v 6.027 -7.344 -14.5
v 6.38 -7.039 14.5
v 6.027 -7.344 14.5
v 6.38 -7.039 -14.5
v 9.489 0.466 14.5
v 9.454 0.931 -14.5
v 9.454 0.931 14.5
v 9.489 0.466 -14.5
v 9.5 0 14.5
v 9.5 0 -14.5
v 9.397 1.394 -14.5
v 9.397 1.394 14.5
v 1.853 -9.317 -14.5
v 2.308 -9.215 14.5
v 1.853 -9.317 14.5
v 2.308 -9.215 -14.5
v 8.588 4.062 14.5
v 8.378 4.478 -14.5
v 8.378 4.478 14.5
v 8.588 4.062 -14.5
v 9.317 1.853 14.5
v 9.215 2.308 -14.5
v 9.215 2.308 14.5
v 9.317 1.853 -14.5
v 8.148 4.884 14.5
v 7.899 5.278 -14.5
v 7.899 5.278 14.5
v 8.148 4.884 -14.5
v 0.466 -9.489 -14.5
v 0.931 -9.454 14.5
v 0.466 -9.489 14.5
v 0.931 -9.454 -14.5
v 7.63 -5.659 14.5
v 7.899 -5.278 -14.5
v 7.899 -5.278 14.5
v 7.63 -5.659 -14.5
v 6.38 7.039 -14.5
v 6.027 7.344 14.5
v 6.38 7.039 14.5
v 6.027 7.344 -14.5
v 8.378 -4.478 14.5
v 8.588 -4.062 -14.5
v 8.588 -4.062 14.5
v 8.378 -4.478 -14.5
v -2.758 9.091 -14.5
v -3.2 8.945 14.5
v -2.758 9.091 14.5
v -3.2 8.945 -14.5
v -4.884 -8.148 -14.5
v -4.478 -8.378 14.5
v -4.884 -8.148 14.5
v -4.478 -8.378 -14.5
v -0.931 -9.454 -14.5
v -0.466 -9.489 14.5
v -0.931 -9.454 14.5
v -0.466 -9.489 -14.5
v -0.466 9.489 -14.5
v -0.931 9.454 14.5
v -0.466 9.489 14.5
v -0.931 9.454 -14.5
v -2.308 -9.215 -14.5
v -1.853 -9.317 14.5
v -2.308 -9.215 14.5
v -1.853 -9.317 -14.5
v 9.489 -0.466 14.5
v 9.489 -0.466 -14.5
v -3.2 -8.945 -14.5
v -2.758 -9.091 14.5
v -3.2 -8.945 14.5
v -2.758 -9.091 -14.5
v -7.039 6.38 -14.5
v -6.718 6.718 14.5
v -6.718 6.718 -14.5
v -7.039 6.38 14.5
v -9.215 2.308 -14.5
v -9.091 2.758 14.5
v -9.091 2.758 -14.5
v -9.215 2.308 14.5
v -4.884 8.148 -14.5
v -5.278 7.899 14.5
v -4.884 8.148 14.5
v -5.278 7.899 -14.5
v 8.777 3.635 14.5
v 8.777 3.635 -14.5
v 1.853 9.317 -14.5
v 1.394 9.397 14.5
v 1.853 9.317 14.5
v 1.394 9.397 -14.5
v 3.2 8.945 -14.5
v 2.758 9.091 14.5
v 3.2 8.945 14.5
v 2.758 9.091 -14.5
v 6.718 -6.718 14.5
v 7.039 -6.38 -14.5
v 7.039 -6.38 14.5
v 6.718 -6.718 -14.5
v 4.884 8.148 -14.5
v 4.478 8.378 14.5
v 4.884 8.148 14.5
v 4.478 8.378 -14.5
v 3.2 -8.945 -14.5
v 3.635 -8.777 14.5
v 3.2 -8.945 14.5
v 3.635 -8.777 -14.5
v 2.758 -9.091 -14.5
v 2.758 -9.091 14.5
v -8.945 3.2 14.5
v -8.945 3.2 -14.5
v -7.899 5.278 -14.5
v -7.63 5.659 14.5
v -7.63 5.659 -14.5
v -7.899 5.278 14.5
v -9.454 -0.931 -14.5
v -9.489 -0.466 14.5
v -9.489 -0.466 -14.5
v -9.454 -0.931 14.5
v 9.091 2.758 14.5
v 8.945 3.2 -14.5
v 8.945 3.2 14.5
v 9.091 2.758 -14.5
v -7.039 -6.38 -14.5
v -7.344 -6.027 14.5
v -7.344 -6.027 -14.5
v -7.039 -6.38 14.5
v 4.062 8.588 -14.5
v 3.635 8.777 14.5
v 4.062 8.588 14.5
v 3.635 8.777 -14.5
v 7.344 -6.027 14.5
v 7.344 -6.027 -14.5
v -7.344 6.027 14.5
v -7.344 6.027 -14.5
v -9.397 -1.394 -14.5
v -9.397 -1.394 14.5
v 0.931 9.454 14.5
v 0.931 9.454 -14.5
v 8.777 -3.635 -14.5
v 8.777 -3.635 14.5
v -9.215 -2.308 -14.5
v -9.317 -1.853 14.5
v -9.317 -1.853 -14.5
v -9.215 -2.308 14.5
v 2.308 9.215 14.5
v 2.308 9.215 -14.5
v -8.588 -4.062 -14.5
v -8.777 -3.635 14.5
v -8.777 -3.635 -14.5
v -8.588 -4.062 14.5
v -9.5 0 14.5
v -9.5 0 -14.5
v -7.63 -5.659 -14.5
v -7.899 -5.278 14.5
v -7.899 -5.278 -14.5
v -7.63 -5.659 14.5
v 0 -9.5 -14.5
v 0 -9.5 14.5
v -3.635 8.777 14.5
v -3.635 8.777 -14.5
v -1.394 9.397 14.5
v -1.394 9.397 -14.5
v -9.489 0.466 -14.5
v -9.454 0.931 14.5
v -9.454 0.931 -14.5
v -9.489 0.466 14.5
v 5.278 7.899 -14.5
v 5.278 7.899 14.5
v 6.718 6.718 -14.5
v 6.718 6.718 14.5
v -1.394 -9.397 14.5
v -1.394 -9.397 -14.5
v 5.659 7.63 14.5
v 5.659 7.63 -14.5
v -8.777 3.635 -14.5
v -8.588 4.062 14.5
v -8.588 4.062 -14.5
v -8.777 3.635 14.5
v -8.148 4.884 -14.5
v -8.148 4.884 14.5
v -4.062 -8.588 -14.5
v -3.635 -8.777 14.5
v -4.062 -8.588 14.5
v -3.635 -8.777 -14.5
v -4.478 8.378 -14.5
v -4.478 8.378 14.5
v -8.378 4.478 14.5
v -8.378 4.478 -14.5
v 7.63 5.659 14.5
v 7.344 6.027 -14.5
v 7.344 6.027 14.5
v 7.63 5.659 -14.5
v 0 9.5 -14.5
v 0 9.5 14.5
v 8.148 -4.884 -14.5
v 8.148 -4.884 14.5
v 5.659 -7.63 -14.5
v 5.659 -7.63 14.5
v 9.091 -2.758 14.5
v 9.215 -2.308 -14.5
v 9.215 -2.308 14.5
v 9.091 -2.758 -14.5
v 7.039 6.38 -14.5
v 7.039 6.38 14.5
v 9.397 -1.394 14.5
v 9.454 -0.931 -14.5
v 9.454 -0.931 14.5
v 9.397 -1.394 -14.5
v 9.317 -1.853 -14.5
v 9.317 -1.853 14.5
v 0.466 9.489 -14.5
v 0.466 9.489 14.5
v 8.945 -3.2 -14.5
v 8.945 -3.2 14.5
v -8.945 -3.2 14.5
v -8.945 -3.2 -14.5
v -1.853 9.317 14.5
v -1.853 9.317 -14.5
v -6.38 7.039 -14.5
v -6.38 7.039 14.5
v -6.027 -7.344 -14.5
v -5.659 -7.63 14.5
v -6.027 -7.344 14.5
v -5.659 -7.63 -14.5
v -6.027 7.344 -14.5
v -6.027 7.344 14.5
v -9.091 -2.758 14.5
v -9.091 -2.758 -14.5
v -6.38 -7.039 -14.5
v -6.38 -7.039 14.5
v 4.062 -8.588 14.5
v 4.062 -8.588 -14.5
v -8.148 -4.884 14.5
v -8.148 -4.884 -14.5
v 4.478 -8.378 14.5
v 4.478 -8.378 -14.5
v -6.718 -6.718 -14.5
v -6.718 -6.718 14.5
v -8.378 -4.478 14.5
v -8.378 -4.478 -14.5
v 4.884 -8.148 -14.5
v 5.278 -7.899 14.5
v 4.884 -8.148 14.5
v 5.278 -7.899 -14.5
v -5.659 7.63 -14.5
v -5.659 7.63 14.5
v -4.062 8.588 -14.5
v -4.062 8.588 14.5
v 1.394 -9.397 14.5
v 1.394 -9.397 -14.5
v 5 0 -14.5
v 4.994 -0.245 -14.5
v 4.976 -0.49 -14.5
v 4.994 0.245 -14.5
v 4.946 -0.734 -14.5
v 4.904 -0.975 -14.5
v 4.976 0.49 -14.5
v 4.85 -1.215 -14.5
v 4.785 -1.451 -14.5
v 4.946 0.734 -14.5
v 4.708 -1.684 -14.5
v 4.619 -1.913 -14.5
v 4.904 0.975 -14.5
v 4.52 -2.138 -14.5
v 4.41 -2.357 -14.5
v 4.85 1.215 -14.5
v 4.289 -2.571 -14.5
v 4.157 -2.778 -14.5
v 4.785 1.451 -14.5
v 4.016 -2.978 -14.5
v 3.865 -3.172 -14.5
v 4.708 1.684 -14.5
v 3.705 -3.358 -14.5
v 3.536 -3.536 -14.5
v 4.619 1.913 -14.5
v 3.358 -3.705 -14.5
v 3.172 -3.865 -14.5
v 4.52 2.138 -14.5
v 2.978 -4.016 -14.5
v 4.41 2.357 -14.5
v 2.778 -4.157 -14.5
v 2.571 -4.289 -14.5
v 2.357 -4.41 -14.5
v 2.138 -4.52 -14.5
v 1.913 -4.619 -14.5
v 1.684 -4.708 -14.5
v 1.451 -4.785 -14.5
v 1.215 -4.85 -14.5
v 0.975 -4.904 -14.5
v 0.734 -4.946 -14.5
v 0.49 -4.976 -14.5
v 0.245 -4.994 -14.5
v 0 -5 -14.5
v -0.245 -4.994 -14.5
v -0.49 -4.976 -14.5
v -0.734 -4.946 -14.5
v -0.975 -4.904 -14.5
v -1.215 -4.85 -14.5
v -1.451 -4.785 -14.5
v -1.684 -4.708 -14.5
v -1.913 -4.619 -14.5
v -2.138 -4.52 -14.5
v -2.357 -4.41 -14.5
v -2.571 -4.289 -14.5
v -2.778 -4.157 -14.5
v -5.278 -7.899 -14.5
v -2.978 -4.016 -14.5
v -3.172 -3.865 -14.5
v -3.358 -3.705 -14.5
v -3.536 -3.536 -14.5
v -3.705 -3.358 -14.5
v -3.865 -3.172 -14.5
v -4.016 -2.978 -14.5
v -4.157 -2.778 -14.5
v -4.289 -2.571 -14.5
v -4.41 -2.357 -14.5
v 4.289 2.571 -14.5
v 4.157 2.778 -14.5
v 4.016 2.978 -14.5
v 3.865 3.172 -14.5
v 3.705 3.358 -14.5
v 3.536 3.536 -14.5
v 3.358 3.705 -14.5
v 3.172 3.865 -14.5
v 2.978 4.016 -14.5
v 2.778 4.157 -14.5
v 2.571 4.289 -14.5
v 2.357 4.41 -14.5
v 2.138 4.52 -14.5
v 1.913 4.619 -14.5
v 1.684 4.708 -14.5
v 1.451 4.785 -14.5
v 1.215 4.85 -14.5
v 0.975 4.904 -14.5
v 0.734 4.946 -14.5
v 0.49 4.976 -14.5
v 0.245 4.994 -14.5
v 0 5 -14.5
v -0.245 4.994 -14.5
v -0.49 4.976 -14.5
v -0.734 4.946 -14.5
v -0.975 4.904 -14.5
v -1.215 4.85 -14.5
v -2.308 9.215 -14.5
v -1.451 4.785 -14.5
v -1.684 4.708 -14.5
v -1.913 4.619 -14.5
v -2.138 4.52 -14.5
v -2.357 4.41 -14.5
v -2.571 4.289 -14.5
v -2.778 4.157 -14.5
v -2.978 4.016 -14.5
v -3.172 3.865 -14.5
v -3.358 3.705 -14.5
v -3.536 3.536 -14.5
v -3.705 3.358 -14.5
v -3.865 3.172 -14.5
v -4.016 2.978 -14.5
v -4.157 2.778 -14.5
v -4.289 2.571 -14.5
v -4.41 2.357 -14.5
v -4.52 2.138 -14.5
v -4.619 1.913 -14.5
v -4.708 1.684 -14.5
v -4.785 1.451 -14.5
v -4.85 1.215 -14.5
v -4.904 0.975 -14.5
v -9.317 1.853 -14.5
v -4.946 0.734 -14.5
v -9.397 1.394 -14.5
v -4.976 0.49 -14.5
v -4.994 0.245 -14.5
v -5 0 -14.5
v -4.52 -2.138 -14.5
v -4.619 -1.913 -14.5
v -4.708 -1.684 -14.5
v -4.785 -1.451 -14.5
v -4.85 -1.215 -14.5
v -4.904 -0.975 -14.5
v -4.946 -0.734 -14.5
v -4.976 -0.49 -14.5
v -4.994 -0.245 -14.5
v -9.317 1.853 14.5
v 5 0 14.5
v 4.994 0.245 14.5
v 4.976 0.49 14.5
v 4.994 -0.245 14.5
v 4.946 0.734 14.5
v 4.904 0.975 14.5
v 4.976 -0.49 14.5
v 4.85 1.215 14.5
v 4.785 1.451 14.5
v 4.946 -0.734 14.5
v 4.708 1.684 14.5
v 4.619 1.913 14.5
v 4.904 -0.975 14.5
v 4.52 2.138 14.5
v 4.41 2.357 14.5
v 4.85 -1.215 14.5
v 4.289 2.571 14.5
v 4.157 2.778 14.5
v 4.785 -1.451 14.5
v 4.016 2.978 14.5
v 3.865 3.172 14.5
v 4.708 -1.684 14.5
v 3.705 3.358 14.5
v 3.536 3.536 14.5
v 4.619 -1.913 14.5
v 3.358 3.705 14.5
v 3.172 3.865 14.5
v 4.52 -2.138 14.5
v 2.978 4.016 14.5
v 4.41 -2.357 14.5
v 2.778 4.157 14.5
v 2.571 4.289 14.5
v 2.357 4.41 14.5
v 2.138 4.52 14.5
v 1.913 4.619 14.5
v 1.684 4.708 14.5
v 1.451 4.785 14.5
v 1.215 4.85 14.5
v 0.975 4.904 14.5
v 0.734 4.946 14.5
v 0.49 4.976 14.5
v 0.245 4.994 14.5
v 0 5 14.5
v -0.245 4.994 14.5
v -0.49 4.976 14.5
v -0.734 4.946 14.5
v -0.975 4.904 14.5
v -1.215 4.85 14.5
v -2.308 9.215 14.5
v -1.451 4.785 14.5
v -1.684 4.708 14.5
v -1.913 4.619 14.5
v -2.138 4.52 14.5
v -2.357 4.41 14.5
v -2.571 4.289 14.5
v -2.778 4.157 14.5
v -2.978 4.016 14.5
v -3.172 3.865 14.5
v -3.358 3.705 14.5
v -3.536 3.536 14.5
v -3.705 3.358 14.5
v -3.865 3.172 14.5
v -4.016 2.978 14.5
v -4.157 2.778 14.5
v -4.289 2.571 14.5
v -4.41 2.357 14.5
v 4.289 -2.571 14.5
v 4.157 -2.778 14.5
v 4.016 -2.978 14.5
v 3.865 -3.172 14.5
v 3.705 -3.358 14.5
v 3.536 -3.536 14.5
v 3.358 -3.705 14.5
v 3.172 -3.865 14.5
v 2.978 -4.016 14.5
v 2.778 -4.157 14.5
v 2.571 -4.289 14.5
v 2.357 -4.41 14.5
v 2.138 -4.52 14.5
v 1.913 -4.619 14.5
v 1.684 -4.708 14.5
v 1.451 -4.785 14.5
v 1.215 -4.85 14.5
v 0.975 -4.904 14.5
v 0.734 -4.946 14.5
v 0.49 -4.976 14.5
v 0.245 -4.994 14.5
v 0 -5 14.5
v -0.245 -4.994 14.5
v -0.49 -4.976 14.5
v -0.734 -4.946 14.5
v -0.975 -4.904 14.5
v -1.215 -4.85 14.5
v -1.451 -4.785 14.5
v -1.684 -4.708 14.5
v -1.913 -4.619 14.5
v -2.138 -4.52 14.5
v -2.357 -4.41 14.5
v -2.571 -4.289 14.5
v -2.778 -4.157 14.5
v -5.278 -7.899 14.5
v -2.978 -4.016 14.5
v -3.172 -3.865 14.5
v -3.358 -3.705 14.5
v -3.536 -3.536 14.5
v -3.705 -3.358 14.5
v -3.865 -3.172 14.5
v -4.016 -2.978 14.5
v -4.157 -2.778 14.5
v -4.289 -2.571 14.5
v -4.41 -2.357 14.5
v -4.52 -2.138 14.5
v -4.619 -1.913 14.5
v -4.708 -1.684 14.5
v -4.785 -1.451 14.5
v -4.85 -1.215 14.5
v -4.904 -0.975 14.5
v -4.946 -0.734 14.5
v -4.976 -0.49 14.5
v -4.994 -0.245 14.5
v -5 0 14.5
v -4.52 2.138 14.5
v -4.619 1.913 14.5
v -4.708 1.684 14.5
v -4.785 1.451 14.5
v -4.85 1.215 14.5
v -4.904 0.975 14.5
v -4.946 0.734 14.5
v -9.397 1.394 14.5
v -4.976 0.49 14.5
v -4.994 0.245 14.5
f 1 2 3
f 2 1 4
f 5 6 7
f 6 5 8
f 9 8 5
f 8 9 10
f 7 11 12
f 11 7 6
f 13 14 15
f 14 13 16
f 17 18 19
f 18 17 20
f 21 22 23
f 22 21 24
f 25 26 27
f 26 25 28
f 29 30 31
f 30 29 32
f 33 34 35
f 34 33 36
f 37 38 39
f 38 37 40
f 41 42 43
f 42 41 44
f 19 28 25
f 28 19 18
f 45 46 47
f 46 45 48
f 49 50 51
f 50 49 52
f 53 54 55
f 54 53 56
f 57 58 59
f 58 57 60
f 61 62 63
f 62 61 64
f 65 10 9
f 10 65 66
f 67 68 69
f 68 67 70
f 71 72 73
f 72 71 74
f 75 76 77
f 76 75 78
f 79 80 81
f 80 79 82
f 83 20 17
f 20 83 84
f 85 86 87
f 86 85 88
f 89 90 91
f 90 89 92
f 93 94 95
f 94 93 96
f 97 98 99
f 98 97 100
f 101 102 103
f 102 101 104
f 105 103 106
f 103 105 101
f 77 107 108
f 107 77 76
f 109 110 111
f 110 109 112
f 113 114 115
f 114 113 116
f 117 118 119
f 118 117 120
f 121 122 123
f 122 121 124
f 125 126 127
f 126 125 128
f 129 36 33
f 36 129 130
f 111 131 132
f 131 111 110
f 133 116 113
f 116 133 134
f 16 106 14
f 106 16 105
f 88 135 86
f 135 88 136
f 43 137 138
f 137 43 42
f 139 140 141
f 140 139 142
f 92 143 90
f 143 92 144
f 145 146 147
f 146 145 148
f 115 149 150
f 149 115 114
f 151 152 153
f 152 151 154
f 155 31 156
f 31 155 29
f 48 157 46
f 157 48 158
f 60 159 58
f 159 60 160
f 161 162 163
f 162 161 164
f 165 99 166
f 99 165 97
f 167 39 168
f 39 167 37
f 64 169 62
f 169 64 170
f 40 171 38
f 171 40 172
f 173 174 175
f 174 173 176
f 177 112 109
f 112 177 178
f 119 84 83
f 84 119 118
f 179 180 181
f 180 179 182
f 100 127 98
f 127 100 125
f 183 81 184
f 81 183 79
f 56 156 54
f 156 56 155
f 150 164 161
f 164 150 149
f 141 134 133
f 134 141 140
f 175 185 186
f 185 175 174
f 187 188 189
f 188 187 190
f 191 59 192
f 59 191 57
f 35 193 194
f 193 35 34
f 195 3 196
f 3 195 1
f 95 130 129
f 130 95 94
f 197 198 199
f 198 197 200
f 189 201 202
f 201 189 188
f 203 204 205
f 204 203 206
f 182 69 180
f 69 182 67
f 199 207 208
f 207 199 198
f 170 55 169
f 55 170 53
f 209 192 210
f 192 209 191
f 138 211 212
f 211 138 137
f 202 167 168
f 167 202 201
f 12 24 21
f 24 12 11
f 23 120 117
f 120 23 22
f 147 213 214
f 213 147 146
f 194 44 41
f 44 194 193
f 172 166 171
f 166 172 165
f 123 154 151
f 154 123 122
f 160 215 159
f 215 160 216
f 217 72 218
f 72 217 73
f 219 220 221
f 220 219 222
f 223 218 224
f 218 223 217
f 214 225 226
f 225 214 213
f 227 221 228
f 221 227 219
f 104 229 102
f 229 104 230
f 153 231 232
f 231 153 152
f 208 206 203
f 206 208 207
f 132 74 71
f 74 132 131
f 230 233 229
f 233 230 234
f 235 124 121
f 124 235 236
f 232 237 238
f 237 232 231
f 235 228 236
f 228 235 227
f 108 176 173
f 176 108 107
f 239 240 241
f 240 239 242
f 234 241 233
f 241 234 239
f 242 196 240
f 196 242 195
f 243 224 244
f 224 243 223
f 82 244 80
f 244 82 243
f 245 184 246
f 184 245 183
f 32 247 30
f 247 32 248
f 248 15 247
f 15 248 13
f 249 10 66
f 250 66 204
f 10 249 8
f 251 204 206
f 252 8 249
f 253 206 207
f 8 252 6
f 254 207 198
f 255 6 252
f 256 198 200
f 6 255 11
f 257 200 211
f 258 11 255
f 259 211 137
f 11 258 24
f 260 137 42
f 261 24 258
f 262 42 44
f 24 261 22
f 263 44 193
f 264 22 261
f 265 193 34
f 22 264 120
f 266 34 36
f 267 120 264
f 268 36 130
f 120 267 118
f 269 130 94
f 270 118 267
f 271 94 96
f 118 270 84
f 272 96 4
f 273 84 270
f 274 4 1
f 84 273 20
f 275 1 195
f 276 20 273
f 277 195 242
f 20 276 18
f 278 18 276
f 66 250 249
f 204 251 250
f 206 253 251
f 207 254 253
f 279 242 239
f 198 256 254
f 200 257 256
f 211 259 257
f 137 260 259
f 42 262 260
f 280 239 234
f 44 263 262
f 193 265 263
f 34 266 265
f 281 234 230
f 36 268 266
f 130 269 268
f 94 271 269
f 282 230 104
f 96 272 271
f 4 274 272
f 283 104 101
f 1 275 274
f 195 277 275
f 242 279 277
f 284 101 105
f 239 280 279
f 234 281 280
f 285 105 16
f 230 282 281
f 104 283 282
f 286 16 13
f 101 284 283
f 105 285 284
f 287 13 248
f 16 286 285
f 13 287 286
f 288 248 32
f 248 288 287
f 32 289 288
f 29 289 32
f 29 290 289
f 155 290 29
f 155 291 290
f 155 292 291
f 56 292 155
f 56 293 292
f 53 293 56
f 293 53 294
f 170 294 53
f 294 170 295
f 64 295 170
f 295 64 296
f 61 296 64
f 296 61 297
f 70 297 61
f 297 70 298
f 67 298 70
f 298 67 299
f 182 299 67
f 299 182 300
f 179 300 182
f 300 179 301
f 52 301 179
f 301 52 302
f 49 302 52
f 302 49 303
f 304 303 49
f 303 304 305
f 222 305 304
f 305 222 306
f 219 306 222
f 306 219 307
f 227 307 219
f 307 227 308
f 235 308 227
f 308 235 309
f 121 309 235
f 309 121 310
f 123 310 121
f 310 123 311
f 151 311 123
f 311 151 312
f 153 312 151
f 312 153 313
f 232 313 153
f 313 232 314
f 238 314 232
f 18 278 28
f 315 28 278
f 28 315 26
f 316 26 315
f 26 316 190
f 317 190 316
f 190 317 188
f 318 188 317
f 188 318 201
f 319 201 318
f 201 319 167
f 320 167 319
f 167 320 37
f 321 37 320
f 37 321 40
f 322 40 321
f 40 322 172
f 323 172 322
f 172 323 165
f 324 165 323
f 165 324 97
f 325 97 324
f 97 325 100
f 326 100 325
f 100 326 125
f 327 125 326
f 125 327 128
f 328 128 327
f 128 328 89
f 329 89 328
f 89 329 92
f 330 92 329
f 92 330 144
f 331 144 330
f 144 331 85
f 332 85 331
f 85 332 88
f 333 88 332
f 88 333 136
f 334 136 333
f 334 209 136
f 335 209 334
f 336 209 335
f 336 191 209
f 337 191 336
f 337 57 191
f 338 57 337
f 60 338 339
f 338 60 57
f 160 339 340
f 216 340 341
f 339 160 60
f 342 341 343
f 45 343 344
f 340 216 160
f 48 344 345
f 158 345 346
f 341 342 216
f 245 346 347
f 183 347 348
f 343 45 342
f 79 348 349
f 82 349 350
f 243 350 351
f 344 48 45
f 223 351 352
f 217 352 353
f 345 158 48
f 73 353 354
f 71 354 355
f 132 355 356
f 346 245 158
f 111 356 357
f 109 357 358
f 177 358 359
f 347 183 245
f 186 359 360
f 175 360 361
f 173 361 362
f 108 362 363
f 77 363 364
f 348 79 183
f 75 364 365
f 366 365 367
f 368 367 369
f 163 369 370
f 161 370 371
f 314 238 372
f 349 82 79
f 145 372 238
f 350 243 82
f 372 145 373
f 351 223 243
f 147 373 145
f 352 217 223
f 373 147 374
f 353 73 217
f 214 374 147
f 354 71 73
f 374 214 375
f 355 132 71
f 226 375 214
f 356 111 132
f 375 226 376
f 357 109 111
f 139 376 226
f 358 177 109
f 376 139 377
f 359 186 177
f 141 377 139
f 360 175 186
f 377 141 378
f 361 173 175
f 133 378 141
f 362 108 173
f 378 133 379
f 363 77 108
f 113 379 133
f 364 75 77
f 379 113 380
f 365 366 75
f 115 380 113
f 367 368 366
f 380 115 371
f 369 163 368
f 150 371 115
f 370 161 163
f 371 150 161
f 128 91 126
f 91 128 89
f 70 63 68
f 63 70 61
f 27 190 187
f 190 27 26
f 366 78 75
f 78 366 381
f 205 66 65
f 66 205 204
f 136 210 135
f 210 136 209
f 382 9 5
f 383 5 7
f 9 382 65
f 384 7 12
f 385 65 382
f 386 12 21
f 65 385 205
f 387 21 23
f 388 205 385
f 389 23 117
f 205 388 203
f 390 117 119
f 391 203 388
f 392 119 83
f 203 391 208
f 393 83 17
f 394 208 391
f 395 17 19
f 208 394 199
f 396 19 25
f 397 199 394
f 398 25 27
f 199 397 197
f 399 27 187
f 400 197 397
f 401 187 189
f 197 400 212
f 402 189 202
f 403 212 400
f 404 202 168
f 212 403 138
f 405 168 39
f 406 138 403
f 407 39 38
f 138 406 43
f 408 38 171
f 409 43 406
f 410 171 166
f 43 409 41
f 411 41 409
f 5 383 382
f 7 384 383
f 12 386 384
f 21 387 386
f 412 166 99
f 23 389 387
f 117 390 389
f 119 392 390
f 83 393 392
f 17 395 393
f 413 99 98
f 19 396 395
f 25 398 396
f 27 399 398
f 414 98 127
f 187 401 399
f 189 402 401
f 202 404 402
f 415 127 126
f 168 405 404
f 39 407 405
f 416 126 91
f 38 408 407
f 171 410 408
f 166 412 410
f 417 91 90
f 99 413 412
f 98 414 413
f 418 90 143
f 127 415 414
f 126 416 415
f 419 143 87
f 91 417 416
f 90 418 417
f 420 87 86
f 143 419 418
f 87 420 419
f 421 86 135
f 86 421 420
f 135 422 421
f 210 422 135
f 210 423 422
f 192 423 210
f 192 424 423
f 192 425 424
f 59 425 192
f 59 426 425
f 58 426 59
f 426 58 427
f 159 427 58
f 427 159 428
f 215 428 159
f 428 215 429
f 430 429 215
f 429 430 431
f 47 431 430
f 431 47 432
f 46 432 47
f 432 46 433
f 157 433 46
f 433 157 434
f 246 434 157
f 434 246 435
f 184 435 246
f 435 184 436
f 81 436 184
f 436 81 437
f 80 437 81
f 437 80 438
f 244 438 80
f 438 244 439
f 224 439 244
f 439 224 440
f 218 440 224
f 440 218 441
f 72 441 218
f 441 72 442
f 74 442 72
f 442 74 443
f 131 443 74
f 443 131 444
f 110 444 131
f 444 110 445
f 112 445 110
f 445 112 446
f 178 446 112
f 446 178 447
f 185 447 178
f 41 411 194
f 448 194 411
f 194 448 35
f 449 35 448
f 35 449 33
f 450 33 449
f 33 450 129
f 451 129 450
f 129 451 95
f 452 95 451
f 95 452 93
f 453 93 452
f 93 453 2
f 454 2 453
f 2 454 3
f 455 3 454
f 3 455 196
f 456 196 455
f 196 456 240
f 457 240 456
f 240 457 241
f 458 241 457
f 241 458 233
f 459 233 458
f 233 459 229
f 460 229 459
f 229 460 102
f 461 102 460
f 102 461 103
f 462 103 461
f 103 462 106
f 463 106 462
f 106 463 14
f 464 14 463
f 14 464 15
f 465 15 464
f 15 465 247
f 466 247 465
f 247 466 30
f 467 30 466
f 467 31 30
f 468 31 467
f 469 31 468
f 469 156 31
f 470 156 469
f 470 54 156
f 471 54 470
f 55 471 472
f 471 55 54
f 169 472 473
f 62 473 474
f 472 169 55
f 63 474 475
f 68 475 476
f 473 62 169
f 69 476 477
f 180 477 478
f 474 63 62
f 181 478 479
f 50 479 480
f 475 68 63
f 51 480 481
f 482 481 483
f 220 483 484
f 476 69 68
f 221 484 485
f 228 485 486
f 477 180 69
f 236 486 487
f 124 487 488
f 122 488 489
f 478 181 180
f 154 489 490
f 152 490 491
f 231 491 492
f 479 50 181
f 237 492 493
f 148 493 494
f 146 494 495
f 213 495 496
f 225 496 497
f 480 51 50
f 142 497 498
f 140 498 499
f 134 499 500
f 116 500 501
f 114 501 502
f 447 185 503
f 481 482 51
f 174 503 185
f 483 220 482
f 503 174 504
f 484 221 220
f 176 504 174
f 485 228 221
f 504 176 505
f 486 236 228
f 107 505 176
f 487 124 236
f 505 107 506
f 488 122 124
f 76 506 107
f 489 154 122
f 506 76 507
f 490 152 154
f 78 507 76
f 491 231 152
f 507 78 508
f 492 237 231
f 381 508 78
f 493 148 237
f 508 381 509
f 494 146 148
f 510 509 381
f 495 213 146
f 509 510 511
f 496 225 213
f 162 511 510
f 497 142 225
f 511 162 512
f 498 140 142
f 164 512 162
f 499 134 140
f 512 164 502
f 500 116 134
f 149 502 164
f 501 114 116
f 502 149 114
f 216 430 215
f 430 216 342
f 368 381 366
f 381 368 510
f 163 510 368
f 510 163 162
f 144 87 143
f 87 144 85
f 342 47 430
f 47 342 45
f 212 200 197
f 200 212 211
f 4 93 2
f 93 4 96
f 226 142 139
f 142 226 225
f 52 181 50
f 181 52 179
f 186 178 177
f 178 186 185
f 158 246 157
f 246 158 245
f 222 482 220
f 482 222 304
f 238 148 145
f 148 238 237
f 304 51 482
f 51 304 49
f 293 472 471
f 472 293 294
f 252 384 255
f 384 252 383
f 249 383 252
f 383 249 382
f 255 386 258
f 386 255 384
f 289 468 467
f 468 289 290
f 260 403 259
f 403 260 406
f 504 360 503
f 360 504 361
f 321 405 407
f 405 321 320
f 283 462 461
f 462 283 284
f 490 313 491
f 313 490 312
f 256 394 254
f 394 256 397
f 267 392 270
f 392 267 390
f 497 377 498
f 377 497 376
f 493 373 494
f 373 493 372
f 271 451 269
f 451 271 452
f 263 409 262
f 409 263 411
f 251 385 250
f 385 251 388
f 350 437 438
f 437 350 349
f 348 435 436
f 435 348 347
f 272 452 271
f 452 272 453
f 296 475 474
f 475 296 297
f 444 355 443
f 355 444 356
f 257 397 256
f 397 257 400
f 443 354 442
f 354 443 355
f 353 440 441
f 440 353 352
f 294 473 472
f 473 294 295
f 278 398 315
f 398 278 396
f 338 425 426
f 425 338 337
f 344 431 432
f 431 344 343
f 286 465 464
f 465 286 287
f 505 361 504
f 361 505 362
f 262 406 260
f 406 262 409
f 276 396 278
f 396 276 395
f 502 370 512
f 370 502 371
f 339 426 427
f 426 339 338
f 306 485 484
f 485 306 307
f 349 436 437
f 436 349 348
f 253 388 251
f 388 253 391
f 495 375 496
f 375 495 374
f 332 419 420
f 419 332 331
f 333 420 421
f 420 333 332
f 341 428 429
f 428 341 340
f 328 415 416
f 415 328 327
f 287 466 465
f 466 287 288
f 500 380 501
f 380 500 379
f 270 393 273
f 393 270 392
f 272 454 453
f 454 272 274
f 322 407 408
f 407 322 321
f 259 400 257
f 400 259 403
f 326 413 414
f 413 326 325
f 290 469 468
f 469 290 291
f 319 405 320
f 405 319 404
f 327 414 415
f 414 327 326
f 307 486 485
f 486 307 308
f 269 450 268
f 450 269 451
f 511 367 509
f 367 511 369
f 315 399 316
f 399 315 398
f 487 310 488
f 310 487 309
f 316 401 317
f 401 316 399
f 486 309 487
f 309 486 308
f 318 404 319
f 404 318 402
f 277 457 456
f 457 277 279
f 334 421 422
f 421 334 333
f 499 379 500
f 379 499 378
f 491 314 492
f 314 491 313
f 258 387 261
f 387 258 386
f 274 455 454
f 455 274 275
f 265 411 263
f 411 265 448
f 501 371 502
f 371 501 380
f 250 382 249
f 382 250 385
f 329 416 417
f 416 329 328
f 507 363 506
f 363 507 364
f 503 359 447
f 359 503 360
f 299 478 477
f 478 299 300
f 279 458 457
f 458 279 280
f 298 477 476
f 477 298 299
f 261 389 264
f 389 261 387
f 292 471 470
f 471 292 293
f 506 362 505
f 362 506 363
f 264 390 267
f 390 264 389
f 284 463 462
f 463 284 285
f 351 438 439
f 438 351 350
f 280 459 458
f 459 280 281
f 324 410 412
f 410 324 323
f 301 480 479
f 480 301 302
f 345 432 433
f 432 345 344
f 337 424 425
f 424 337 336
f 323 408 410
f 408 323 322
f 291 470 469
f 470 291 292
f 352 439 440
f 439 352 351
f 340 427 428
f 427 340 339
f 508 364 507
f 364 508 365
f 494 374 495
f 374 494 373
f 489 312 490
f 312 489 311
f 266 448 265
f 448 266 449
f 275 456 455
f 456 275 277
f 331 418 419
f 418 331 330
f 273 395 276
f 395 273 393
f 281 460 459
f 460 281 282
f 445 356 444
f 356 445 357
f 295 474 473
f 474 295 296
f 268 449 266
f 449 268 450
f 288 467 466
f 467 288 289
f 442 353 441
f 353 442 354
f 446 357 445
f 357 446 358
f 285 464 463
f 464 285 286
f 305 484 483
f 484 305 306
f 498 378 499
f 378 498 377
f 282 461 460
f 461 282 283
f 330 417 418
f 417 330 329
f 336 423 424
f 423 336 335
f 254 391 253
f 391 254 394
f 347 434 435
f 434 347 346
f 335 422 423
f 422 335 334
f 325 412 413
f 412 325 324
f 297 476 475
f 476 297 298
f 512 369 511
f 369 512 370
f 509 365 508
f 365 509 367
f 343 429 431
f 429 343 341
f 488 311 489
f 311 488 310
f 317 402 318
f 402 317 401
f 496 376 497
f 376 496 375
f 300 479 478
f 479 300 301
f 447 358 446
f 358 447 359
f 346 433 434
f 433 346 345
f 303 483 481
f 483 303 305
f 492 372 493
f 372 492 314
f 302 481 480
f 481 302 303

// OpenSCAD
$fn = 128;

bore_d = 10.0;
od_d   = 19.0;
len    = 29.0;

eps = 0.02;

difference() {
    cylinder(d = od_d, h = len, center = true);
    cylinder(d = bore_d, h = len + 2*eps, center = true);
}
